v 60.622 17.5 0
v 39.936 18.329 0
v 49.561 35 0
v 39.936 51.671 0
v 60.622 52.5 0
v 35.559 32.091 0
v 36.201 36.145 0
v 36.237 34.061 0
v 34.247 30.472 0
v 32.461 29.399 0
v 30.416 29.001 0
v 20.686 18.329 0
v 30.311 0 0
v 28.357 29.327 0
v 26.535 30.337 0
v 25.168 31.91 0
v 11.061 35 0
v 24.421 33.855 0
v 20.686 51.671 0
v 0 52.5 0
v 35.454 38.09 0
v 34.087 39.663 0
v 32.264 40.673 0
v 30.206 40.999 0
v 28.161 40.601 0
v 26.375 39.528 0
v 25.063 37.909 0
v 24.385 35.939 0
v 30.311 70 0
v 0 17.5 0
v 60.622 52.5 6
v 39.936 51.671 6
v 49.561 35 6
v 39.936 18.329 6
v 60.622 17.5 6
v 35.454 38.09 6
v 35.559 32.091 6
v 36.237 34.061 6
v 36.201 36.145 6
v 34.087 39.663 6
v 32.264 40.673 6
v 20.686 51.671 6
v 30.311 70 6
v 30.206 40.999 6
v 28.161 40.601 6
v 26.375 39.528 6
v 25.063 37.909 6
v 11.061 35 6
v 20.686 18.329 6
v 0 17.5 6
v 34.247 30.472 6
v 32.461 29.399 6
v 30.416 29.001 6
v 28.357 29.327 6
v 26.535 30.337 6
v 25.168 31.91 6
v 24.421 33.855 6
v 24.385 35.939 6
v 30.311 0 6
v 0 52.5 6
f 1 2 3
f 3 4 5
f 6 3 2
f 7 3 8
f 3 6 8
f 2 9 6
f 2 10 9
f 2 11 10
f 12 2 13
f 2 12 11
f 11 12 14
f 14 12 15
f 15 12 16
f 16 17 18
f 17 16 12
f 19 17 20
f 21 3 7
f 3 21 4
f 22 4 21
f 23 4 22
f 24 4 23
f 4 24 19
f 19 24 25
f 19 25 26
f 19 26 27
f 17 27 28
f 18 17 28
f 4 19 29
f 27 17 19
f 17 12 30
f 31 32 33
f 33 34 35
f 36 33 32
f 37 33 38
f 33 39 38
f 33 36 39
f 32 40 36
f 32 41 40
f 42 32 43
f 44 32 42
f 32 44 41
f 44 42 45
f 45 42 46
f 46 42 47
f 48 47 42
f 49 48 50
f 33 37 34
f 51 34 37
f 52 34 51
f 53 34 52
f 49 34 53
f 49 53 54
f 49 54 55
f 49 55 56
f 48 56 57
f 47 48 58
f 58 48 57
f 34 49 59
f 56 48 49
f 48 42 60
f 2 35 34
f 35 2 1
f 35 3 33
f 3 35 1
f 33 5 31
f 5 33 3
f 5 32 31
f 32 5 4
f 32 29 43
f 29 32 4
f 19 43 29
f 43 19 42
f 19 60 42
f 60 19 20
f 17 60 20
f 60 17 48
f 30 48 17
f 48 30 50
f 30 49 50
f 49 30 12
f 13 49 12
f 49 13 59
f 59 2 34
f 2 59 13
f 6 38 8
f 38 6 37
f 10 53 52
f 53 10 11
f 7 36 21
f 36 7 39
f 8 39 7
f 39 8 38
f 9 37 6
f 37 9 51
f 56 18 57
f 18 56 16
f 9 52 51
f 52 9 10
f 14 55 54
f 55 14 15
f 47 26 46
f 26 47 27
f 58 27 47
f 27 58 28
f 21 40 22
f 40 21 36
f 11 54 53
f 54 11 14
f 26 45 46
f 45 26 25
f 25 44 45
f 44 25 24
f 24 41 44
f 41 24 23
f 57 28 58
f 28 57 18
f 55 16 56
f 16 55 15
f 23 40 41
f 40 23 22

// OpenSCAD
$fn = 32;

// ----------------------------------------------------------------------
// Star wheel: 6-point star, R35
// ----------------------------------------------------------------------

// --- parameters (mm) ---
n_points = 6;             // number of points / teeth
r_out = 35;               // tip radius
r_in = 19.25;             // root radius
bore_r = 6;               // centre bore radius
plate_t = 6;              // plate thickness, Z (extrusion height)
bore_d = 12;              // centre bore diameter

profile = [[30.311, 70], [20.686, 51.671], [0, 52.5], [11.061, 35], [0, 17.5], [20.686, 18.329], [30.311, 0], [39.936, 18.329], [60.622, 17.5], [49.561, 35], [60.622, 52.5], [39.936, 51.671]];  // primary outline, 12 points, counter clockwise
void_1 = [[36.201, 36.145], [35.454, 38.09], [34.087, 39.663], [32.264, 40.673], [30.206, 40.999], [28.161, 40.601], [26.375, 39.528], [25.063, 37.909], [24.385, 35.939], [24.421, 33.855], [25.168, 31.91], [26.535, 30.337], [28.357, 29.327], [30.416, 29.001], [32.461, 29.399], [34.247, 30.472], [35.559, 32.091], [36.237, 34.061]];  // centre bore, 18 points

// --- the one profile operation ---
difference() {
  linear_extrude(height = plate_t) polygon(points = profile);
  translate([0, 0, -1])
    linear_extrude(height = plate_t + 2) polygon(points = void_1);
}
